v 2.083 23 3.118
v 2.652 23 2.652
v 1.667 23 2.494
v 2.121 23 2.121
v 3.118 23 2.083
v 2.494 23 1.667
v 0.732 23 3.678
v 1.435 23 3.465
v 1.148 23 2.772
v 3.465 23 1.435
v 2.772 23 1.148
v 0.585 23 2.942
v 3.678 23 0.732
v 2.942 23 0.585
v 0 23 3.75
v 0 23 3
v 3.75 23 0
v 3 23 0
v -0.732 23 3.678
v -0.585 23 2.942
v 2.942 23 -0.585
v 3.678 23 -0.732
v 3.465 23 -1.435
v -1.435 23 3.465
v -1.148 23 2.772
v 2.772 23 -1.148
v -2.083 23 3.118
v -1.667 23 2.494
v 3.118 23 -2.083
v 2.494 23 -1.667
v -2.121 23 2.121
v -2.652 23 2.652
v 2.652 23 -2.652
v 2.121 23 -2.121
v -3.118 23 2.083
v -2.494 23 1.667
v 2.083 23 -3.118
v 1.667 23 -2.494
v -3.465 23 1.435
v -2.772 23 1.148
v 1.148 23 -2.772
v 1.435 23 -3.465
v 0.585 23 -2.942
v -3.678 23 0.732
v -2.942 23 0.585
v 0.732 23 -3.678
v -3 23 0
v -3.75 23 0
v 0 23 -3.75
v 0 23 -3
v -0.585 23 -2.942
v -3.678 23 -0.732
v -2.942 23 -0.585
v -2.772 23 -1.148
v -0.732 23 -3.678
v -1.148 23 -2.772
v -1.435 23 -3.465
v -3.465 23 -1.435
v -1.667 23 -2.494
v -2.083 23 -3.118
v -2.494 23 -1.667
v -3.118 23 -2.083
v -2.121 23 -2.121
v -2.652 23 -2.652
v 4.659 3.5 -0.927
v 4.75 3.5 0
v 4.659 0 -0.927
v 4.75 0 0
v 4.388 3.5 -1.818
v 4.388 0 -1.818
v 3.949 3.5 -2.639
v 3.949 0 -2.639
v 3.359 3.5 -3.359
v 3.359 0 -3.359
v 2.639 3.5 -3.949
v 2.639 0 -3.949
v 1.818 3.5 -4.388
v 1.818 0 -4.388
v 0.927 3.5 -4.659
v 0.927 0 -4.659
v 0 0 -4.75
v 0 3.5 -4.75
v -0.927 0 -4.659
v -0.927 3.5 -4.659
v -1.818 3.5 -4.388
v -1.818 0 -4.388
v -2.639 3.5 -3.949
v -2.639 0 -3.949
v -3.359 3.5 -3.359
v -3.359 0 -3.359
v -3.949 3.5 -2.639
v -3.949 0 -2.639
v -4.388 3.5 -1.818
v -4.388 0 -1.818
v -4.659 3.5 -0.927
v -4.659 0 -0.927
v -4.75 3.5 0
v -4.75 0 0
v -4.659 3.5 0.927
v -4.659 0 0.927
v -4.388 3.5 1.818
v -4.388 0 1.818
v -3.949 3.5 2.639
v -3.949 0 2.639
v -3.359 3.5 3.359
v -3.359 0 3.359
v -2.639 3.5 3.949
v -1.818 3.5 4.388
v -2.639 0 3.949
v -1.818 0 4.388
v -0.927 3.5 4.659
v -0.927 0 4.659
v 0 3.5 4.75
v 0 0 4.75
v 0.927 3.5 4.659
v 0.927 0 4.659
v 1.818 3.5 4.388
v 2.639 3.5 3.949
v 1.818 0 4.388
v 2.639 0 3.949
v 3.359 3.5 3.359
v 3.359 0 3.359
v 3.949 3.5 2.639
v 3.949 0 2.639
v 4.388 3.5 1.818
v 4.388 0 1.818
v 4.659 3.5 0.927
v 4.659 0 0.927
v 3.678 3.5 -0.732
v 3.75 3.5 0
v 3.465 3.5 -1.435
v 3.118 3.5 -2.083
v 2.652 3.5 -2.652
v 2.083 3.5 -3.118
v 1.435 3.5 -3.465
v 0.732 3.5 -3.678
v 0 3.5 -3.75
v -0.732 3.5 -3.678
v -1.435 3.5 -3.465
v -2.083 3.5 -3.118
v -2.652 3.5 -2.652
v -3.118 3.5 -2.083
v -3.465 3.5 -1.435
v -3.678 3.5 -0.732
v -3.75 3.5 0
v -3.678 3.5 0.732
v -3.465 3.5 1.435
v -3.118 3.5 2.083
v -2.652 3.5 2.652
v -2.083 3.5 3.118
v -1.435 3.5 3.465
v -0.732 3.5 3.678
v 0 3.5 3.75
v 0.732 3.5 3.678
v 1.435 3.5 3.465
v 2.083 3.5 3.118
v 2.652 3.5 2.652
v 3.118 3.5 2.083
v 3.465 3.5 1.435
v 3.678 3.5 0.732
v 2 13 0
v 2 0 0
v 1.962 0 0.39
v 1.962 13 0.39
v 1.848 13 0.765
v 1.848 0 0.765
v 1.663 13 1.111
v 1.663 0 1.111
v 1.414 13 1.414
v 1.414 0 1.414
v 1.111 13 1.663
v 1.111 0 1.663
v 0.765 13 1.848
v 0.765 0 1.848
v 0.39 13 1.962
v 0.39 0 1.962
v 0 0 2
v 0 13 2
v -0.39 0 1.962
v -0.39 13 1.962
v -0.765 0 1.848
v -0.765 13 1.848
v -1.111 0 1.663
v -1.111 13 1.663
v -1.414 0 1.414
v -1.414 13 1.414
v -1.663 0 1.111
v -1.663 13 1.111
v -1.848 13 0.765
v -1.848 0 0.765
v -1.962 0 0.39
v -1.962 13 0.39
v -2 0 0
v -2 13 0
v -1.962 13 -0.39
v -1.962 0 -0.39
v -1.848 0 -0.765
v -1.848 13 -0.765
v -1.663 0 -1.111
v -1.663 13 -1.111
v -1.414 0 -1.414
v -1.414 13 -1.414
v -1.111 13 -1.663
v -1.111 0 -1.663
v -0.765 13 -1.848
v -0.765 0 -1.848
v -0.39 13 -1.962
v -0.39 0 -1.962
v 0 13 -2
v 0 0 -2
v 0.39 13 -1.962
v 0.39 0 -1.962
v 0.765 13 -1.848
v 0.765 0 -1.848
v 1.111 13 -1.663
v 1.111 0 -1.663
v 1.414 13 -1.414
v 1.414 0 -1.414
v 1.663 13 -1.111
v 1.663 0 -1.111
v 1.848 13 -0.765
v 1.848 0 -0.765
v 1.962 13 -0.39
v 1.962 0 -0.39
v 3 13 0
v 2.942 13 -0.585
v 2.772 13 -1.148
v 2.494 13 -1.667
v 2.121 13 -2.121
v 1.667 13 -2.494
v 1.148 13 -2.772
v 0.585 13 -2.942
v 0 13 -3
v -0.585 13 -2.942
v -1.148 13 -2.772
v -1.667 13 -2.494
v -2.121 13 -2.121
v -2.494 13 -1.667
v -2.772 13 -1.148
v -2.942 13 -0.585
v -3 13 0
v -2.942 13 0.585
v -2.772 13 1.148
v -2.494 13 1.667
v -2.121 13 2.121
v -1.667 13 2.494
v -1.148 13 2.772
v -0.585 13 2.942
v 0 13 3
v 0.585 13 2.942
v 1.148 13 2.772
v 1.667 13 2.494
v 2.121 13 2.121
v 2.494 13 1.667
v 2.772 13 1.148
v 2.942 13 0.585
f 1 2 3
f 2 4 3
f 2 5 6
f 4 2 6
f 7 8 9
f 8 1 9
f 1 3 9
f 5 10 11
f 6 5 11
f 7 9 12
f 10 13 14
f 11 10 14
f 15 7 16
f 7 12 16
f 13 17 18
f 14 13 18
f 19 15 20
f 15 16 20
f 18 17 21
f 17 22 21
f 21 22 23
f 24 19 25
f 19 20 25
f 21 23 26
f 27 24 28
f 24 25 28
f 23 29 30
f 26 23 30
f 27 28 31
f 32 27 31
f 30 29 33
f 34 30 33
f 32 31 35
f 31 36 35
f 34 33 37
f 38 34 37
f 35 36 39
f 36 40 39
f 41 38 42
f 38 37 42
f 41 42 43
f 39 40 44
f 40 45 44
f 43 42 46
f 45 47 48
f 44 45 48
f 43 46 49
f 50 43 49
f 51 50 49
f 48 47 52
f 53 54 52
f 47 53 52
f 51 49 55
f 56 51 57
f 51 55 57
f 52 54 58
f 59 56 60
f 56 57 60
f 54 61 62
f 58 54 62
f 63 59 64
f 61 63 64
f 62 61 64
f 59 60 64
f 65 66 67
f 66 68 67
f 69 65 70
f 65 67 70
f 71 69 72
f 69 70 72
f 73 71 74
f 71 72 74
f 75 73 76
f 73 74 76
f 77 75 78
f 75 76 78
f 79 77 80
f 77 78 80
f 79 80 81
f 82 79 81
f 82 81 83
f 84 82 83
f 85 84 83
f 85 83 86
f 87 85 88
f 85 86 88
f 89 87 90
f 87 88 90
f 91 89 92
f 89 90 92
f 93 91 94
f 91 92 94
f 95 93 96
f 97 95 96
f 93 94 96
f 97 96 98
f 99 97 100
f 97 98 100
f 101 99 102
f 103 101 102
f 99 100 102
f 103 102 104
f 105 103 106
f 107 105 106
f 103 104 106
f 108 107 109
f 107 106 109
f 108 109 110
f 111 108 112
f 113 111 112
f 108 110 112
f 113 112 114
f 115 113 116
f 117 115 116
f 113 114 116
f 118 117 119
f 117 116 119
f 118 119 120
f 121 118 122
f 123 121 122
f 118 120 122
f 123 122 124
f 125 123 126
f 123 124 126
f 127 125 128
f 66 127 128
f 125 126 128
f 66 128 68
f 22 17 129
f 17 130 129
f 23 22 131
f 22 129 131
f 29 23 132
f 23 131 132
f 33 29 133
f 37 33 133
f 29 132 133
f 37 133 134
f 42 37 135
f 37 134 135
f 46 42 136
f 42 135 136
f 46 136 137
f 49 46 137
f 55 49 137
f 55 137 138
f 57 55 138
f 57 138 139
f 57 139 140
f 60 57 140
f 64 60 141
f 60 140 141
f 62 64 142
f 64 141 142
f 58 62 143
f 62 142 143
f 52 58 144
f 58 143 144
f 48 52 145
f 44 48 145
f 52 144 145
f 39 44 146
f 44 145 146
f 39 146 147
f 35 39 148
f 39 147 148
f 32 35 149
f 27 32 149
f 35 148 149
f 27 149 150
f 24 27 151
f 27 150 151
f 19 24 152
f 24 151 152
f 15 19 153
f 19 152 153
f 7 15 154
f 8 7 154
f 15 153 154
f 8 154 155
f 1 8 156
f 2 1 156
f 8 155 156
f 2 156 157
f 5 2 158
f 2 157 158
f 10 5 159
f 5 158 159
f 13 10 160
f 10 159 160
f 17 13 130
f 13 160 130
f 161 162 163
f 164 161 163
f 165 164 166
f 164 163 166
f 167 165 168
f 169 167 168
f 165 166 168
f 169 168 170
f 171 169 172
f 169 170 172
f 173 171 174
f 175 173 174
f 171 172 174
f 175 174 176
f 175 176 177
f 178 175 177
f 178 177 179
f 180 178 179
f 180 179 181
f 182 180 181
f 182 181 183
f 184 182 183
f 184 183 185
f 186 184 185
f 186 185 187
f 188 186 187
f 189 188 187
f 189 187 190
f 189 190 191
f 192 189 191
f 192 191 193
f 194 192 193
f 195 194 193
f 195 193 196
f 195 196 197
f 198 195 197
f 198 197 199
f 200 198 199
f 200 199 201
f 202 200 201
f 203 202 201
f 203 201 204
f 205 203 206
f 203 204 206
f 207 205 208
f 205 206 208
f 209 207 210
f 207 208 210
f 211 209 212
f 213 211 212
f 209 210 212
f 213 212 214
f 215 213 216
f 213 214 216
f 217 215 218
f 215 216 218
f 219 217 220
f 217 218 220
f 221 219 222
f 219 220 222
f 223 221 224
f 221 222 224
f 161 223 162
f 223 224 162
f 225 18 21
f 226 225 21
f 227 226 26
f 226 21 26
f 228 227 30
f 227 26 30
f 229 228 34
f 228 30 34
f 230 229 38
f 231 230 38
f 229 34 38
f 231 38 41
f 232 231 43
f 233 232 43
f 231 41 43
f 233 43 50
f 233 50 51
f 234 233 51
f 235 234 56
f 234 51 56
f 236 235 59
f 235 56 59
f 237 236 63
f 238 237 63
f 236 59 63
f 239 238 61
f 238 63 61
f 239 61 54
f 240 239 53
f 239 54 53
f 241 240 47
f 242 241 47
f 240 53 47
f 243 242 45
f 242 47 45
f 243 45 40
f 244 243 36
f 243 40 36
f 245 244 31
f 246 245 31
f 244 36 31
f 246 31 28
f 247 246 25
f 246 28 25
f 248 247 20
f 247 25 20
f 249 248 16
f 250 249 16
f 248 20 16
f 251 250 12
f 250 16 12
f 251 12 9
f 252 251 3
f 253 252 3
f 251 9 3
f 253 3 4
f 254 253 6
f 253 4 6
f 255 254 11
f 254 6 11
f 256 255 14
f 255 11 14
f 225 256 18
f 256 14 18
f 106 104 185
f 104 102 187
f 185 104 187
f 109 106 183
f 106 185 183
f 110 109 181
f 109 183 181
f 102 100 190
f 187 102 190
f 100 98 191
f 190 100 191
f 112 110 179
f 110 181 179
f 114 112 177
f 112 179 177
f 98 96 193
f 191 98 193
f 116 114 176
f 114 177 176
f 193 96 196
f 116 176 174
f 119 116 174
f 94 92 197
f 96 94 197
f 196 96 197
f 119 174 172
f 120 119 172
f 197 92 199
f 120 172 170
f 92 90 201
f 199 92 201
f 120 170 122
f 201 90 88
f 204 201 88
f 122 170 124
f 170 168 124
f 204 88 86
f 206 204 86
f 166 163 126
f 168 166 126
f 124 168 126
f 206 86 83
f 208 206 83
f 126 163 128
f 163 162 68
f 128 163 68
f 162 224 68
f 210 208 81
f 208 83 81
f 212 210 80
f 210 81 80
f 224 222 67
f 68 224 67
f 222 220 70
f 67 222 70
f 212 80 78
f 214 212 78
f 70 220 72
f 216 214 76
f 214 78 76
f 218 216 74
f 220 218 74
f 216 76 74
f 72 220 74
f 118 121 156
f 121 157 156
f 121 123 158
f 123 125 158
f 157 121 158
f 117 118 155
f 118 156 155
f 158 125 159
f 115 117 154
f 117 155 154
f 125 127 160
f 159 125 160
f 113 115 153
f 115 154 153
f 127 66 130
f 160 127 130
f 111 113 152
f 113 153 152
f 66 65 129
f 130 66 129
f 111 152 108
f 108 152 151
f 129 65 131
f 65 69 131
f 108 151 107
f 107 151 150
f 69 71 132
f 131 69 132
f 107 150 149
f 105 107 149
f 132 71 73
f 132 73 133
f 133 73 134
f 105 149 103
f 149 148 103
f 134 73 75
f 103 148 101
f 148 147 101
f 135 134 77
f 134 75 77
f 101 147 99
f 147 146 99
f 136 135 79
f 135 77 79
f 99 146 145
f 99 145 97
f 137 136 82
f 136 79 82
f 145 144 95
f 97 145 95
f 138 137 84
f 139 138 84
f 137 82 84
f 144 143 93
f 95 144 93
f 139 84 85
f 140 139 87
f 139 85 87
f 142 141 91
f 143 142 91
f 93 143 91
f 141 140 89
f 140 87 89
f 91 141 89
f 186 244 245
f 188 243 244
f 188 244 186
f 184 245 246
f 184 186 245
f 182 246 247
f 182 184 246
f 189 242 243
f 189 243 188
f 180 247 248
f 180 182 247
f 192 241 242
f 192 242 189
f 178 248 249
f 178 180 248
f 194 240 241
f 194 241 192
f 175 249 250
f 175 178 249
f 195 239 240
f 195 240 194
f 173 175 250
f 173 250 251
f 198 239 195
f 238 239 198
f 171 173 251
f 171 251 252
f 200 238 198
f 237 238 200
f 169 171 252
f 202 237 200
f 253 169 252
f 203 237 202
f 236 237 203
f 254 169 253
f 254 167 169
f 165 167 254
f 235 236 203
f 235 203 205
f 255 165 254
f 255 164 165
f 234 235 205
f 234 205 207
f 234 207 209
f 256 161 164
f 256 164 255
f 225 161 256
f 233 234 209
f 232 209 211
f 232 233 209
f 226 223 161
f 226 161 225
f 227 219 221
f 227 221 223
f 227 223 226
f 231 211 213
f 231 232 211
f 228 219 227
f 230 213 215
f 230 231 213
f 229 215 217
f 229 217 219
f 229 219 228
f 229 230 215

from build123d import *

# Parameters (mm, degrees)
SKETCH_2_R          = 3
CUT_EXTRUDE_1_DEPTH = 10
SKETCH_3_R          = 2
CUT_EXTRUDE_2_DEPTH = 24


with BuildPart() as part:
    # Эскиз1 → Повернуть1 (revolve)
    with BuildSketch(Plane.XY):
        Polygon((3.75, 23), (3.75, 3.5), (4.75, 3.5), (4.75, 0), (0, 0), (0, 23), align=None)
    revolve(axis=Axis((0, 0, 0), (0, 1, 0)))

    # Эскиз2 → Вырез-Вытянуть1 (cut)
    with BuildSketch(Plane(origin=(0, 23, 0), x_dir=(1, 0, 0), z_dir=(0, 1, 0))):
        Circle(SKETCH_2_R)
    extrude(amount=-CUT_EXTRUDE_1_DEPTH, mode=Mode.SUBTRACT)

    # Эскиз3 → Вырез-Вытянуть2 (cut, through all)
    with BuildSketch(Plane.XZ):
        Circle(SKETCH_3_R)
    extrude(amount=-CUT_EXTRUDE_2_DEPTH, mode=Mode.SUBTRACT)


solid = part.part
